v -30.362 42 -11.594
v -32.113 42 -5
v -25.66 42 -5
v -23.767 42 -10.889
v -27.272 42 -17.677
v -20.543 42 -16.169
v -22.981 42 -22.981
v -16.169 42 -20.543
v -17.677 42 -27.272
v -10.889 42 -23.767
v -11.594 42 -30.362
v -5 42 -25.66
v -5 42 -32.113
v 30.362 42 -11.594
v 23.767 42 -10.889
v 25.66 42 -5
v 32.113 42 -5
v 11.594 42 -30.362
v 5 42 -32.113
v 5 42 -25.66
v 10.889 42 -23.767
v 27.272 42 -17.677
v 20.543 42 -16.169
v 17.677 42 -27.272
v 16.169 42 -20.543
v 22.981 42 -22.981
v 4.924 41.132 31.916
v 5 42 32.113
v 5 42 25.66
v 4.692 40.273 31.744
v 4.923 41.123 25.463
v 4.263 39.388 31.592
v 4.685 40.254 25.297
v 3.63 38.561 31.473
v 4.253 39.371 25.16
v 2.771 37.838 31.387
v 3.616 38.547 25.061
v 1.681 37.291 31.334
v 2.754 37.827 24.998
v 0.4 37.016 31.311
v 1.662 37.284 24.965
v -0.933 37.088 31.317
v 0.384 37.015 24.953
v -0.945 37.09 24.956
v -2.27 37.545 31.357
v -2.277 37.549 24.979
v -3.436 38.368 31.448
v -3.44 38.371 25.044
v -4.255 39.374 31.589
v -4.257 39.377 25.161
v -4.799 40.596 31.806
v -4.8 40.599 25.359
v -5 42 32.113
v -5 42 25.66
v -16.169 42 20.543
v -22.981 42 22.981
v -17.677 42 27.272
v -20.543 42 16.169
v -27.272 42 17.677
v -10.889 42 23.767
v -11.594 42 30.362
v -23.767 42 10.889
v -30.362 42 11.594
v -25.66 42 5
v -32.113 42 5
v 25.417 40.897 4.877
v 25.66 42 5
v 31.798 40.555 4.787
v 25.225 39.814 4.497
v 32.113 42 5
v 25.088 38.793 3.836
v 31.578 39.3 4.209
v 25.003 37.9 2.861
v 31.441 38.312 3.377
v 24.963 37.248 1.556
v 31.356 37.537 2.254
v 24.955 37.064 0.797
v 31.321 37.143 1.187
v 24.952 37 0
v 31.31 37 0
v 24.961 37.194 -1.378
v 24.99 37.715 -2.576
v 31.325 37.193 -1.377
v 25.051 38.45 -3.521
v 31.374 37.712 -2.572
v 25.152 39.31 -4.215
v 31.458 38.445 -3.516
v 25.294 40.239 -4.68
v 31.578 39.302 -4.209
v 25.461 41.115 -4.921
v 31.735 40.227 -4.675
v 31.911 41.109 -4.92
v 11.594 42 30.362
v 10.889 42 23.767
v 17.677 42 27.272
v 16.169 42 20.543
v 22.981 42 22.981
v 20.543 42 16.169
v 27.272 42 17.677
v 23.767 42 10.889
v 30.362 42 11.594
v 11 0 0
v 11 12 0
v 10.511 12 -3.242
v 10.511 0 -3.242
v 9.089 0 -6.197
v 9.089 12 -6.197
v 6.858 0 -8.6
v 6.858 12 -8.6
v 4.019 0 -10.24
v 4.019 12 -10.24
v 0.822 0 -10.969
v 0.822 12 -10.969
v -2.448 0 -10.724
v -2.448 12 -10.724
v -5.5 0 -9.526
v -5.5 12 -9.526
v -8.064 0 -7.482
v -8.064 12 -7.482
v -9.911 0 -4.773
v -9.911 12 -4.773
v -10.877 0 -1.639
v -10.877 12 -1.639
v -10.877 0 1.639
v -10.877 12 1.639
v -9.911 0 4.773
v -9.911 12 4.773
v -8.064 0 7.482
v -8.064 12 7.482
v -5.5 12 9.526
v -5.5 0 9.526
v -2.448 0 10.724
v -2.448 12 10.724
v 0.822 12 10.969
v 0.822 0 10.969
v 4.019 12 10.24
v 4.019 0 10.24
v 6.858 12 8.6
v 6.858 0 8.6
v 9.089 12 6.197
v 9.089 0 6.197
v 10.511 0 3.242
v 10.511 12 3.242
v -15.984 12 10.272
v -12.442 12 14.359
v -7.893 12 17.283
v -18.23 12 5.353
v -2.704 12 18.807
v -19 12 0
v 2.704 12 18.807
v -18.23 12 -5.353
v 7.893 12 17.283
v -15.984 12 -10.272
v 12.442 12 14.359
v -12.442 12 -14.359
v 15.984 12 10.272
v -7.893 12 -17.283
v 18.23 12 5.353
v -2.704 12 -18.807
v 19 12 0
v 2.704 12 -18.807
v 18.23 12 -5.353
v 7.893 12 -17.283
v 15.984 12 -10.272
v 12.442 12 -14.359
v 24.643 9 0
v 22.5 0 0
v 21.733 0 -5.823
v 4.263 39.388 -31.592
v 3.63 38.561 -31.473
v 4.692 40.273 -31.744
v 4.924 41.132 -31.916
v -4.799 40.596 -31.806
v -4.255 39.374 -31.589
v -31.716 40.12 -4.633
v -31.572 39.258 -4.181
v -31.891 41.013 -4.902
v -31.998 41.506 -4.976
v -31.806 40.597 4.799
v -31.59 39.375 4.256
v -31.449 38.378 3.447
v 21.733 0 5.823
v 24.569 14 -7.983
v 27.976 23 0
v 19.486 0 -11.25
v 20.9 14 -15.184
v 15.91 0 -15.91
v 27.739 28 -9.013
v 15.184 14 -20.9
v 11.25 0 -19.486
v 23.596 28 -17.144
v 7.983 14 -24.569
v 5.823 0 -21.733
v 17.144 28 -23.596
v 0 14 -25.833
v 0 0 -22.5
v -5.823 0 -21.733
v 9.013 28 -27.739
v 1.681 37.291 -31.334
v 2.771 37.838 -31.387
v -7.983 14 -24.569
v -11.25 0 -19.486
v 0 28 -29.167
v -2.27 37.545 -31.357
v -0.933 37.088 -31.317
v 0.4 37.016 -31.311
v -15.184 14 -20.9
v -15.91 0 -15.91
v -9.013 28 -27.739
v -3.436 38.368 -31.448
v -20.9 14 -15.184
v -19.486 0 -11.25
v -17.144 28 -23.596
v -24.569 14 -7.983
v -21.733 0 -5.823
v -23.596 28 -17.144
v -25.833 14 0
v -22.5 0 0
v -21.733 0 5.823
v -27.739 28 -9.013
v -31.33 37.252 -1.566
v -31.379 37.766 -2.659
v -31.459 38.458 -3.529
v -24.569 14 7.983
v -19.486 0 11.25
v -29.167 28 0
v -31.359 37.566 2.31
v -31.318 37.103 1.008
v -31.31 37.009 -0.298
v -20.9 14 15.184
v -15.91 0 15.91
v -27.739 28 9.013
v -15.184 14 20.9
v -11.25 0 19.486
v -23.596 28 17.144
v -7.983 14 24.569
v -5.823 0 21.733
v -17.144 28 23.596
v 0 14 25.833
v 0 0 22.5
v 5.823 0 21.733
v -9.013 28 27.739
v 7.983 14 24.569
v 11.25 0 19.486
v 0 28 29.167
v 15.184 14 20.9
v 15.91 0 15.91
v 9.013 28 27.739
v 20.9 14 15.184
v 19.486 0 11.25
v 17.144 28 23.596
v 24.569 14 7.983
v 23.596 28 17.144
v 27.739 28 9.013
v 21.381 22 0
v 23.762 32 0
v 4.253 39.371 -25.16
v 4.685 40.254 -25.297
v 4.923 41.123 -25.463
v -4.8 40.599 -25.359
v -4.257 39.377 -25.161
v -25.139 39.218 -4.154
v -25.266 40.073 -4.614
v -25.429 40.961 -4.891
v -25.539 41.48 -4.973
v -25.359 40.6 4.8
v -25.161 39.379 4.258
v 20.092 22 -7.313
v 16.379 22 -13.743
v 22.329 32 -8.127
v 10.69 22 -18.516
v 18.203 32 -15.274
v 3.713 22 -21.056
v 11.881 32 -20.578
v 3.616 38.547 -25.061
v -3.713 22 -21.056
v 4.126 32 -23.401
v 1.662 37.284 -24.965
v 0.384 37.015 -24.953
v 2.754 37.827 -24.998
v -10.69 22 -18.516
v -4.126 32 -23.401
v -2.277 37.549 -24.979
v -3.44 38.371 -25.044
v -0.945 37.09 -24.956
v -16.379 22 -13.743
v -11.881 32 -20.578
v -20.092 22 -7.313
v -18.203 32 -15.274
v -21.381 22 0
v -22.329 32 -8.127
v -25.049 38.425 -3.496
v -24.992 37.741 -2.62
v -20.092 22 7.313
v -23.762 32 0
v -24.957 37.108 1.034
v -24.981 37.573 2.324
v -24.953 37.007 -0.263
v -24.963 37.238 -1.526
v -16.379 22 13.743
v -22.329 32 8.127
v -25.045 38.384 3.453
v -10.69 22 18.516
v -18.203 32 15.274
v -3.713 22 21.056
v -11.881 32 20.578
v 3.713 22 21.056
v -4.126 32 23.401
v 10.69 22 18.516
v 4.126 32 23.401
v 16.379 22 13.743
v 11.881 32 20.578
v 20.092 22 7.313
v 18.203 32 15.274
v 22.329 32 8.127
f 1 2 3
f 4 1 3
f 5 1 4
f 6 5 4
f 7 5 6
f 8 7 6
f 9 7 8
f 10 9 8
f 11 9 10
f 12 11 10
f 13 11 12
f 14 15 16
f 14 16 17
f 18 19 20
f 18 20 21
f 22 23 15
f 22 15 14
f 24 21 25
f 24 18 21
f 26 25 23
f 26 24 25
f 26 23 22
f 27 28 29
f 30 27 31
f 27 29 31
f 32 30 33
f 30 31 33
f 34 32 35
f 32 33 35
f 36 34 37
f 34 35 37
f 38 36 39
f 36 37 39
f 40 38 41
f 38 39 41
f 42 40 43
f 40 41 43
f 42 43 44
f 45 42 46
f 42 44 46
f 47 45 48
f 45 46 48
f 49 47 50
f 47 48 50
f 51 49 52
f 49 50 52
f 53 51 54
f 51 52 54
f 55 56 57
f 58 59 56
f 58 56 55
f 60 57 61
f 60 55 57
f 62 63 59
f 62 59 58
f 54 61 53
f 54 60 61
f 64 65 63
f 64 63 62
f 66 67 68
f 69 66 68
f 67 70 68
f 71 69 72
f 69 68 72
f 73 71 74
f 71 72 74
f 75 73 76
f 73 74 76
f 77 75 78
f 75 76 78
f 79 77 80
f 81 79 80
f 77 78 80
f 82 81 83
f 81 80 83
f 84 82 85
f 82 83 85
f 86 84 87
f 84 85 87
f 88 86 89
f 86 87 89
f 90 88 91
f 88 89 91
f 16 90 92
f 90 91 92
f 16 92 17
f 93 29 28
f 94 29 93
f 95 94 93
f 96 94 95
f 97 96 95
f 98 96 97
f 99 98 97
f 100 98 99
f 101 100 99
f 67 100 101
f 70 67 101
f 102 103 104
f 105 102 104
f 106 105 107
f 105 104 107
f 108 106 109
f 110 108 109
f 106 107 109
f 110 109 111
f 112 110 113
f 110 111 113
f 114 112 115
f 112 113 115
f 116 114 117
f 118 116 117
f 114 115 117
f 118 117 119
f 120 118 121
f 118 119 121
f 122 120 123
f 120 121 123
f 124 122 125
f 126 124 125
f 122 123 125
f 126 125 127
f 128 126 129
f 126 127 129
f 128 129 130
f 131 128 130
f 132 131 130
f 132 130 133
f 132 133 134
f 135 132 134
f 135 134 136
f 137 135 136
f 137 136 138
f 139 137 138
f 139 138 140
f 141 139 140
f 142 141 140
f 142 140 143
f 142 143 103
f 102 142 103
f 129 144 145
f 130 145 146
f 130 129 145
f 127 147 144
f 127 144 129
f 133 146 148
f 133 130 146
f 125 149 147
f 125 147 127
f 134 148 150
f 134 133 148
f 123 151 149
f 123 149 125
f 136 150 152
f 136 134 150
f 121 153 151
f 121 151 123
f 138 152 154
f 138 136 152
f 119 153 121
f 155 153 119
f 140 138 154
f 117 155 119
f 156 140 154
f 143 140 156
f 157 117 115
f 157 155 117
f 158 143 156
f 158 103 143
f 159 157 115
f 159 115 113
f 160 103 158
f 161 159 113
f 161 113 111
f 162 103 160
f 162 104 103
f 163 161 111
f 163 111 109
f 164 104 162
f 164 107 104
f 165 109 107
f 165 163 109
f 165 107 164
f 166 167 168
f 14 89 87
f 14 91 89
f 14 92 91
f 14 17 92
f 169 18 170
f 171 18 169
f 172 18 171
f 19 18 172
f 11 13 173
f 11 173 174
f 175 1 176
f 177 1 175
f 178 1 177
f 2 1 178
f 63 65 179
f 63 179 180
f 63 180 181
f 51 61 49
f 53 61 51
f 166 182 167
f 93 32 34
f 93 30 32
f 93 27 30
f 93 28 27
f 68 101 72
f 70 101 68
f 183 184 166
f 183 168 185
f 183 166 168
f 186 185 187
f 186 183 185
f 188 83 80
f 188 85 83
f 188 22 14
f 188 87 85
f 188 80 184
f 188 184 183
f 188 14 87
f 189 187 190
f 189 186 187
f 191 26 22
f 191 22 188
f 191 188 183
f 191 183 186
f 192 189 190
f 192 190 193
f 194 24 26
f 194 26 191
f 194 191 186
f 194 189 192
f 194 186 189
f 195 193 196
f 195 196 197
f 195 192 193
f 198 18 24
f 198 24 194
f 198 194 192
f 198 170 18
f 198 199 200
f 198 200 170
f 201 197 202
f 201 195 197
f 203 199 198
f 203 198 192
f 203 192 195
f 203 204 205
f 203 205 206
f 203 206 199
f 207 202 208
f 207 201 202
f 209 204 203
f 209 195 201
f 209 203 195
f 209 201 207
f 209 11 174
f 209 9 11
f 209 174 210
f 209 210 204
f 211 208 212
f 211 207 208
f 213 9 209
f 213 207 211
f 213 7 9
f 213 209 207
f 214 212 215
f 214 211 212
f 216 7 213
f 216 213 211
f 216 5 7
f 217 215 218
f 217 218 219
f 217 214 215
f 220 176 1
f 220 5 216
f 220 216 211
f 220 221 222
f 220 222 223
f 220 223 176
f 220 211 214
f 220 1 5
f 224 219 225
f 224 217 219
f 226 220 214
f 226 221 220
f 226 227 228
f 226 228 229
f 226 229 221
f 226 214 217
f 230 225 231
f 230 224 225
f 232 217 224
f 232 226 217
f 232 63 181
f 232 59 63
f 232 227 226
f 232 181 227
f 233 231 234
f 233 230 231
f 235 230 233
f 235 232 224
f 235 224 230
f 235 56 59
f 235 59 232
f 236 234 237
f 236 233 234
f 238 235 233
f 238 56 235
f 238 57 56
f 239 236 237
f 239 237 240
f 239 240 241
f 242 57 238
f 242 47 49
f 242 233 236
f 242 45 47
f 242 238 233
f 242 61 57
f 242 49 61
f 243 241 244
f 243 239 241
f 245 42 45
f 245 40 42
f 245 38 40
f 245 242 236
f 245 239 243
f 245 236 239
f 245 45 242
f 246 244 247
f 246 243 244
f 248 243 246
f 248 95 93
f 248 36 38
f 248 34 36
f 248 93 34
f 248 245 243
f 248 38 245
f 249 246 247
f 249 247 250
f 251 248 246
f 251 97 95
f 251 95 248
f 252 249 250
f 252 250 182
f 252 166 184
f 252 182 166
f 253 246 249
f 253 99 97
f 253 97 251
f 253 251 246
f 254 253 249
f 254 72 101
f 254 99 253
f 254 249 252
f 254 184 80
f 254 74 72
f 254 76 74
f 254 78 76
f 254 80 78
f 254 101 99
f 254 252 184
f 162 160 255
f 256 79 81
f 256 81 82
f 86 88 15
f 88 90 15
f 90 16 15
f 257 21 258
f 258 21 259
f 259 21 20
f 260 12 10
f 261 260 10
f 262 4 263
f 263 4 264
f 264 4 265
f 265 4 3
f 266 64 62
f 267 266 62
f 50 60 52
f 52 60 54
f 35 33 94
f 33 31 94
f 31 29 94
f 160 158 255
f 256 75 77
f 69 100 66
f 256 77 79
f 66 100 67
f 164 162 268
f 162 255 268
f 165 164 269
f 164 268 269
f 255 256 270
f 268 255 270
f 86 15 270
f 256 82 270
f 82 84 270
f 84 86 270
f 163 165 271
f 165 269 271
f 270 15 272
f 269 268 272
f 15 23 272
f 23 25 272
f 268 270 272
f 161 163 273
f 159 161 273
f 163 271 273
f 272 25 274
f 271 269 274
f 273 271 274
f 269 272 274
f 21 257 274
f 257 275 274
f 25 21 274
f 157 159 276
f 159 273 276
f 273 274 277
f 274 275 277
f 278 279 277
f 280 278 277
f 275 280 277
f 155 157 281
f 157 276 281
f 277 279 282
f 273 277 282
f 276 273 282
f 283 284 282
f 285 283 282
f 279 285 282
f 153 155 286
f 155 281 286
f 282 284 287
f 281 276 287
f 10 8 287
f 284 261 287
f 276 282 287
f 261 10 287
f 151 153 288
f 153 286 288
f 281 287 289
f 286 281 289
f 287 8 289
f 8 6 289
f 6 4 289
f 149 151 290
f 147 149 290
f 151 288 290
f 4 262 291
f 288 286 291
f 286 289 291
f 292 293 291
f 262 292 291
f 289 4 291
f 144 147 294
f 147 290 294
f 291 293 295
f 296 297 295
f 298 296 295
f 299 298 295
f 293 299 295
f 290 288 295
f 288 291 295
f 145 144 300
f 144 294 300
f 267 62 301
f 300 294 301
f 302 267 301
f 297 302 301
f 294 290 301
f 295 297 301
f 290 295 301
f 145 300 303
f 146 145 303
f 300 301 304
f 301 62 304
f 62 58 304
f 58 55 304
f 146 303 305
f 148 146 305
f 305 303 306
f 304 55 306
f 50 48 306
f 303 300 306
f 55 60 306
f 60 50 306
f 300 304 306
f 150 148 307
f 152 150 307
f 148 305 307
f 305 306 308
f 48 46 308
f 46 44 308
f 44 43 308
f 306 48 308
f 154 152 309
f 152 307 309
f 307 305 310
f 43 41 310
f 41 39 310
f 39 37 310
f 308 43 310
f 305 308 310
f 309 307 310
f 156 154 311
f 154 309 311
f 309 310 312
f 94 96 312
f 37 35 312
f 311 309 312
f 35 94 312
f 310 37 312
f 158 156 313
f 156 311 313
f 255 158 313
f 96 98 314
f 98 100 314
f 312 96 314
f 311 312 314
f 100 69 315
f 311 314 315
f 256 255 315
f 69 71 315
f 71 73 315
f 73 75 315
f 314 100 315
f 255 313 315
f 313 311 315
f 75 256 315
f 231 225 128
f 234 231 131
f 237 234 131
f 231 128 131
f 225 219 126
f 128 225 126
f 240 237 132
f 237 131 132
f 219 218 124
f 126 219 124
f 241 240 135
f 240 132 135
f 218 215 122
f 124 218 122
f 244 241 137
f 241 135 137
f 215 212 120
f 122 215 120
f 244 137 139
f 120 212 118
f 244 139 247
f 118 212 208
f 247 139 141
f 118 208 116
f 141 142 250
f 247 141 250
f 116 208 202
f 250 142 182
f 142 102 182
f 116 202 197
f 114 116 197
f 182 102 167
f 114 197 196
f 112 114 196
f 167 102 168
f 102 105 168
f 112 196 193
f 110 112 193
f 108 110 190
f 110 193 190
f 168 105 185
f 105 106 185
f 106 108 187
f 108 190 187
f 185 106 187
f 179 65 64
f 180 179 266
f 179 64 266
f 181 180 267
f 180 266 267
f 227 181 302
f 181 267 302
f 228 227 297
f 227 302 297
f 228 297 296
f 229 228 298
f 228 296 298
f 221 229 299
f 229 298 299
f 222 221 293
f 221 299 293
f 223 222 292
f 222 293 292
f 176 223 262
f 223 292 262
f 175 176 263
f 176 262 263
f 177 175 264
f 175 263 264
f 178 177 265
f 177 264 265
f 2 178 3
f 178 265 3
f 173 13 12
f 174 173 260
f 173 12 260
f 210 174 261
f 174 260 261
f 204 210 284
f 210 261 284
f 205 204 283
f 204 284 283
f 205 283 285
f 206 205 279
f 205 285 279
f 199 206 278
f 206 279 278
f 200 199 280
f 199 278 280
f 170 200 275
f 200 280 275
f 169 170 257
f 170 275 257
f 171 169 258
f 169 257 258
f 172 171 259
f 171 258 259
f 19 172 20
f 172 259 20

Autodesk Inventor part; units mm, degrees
ref_plane "YZ Plane" through (0, 0, 0) normal (1, 0, 0) x (0, 1, 0)
ref_plane "XZ Plane" through (0, 0, 0) normal (0, 1, 0) x (-1, 0, 0)
ref_plane "XY Plane" through (0, 0, 0) normal (0, 0, 1) x (1, 0, 0)
sketch "Sketch1" plane through (0, 0, 0) normal (0, 0, 1) x (1, 0, 0)
  line L0 (11, 0) -> (22.5, 0)
  line L1 (11, 0) -> (11, 12)
  line L2 (11, 12) -> (19, 12)
  line L3 (32.5, 42) -> (22.5, 0)
  line L4 (19, 12) -> (26.1429, 42)
  line L5 (26.1429, 42) -> (32.5, 42)
  line L6 (0, -8.4) -> (0, 50.4) projected
  point P0 (0, 0)
  dimension "d0" = 11.5
  dimension "d1" = 11
  dimension "d2" = 22.5
  dimension "d3" = 12
  dimension "d4" = 19
  dimension "d5" = 8
  dimension "d7" = 6.1843
  dimension "d8" = 32.5
  dimension "d9" = 42
revolve "Revolution1" add sketch "Sketch1" angle 360 about axis through (0, -10, 0) along (0, 1, 0)
sketch "Sketch2" plane through (0, 0, 0) normal (0, 0, 1) x (1, 0, 0)
  line L0 (-32.5, 42) -> (32.5, 42) projected
  circle A0 centre (0, 42) radius 5
  point P0 (0, 0)
  dimension "d11" = 10
extrude "Extrusion1" cut sketch "Sketch2" along normal through all both and the other way through all
sketch "Sketch3" plane through (0, 0, 0) normal (1, 0, 0) x (0, 1, 0)
  line L0 (42, 25.6603) -> (42, -25.6603) projected
  circle A0 centre (42, 0) radius 5
  point P0 (0, 0)
  dimension "d14" = 10
extrude "Extrusion2" cut sketch "Sketch3" along normal through all both and the other way through all
properties part number "Screw Jack Cup"
